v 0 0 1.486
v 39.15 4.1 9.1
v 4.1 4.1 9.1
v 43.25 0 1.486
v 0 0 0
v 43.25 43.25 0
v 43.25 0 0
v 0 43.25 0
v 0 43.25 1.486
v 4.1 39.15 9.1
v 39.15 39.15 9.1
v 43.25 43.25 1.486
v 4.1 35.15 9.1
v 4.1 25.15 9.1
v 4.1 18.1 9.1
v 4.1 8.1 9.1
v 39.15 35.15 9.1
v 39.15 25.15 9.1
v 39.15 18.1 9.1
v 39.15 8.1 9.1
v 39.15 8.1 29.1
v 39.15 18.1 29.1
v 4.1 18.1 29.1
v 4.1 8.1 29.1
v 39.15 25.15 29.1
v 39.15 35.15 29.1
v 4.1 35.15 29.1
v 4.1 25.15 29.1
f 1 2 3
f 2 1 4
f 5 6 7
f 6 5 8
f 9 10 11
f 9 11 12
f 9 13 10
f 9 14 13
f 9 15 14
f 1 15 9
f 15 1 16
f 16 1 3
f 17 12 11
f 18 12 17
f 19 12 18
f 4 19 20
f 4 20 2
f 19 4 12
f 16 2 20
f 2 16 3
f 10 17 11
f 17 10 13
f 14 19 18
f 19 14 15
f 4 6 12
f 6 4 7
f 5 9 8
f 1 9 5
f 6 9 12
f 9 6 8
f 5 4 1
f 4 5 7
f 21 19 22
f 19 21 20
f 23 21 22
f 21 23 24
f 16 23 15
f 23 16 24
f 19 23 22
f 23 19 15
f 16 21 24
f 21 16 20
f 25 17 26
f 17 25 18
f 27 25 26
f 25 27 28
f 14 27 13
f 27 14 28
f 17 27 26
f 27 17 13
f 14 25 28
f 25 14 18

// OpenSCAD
// [FL_INDEX: keywords="openscad, 3d_parametric, Customizable_Phone_Tripod_Mount, csg_solid" | COT="Parametric OpenSCAD design from 3DCodeverse"]
// Title: Customizable Phone Tripod Mount

// Phone width in mm (iPhone4/S=9.3, iPhone5=7.6, iPhone6=7.05)
phone_width=7.05;

// Width of the base of your tripod mount
base_width=43.25;

// Height of the slanted area of your tripod mount
base_height=9.1;

// Difference in width between the base and top of the mount
base_inset=4.1;

// Difference in width between the base bottom width and width if it hadn't been chopped off
base_cutout = 0.8;

// Width of the holder bars
holder_width=10;

// Height of the holder bars
holder_height=20;

base_width_2 = base_width + base_cutout;

phone_width_2 = phone_width + 0.05; // add a tiny bit of extra so phone can slide in

union() {

// base
intersection() {
    //slanted cube
	polyhedron(points=[[-base_cutout,-base_cutout,0],
                   [base_inset,base_inset,base_height],
                   [-base_cutout,base_width+base_cutout,0],
                   [base_inset,base_width-base_inset,base_height],
                   [base_width+base_cutout,base_width+base_cutout,0],
                   [base_width-base_inset,base_width-base_inset,base_height],
                   [base_width+base_cutout,-base_cutout,0],
                   [base_width-base_inset,base_inset,base_height]],
           triangles=[[2,1,0],[1,2,3],[4,3,2],[3,4,5],[6,5,4],[5,6,7],[0,7,6],[7,0,1],
				     [4,2,0],[0,6,4],[1,3,5],[5,7,1]]
           );
	
	//whatever the bigger shape, clip it to base_width
	cube([base_width,base_width,50]);
}

// phone holder
translate([base_inset,base_width-base_width/2-holder_width-phone_width/2,base_height]) 
	cube([base_width-base_inset*2,holder_width,holder_height]);
translate([base_inset,base_width-base_width/2+phone_width/2,base_height])
	cube([base_width-base_inset*2,holder_width,holder_height]);

}
